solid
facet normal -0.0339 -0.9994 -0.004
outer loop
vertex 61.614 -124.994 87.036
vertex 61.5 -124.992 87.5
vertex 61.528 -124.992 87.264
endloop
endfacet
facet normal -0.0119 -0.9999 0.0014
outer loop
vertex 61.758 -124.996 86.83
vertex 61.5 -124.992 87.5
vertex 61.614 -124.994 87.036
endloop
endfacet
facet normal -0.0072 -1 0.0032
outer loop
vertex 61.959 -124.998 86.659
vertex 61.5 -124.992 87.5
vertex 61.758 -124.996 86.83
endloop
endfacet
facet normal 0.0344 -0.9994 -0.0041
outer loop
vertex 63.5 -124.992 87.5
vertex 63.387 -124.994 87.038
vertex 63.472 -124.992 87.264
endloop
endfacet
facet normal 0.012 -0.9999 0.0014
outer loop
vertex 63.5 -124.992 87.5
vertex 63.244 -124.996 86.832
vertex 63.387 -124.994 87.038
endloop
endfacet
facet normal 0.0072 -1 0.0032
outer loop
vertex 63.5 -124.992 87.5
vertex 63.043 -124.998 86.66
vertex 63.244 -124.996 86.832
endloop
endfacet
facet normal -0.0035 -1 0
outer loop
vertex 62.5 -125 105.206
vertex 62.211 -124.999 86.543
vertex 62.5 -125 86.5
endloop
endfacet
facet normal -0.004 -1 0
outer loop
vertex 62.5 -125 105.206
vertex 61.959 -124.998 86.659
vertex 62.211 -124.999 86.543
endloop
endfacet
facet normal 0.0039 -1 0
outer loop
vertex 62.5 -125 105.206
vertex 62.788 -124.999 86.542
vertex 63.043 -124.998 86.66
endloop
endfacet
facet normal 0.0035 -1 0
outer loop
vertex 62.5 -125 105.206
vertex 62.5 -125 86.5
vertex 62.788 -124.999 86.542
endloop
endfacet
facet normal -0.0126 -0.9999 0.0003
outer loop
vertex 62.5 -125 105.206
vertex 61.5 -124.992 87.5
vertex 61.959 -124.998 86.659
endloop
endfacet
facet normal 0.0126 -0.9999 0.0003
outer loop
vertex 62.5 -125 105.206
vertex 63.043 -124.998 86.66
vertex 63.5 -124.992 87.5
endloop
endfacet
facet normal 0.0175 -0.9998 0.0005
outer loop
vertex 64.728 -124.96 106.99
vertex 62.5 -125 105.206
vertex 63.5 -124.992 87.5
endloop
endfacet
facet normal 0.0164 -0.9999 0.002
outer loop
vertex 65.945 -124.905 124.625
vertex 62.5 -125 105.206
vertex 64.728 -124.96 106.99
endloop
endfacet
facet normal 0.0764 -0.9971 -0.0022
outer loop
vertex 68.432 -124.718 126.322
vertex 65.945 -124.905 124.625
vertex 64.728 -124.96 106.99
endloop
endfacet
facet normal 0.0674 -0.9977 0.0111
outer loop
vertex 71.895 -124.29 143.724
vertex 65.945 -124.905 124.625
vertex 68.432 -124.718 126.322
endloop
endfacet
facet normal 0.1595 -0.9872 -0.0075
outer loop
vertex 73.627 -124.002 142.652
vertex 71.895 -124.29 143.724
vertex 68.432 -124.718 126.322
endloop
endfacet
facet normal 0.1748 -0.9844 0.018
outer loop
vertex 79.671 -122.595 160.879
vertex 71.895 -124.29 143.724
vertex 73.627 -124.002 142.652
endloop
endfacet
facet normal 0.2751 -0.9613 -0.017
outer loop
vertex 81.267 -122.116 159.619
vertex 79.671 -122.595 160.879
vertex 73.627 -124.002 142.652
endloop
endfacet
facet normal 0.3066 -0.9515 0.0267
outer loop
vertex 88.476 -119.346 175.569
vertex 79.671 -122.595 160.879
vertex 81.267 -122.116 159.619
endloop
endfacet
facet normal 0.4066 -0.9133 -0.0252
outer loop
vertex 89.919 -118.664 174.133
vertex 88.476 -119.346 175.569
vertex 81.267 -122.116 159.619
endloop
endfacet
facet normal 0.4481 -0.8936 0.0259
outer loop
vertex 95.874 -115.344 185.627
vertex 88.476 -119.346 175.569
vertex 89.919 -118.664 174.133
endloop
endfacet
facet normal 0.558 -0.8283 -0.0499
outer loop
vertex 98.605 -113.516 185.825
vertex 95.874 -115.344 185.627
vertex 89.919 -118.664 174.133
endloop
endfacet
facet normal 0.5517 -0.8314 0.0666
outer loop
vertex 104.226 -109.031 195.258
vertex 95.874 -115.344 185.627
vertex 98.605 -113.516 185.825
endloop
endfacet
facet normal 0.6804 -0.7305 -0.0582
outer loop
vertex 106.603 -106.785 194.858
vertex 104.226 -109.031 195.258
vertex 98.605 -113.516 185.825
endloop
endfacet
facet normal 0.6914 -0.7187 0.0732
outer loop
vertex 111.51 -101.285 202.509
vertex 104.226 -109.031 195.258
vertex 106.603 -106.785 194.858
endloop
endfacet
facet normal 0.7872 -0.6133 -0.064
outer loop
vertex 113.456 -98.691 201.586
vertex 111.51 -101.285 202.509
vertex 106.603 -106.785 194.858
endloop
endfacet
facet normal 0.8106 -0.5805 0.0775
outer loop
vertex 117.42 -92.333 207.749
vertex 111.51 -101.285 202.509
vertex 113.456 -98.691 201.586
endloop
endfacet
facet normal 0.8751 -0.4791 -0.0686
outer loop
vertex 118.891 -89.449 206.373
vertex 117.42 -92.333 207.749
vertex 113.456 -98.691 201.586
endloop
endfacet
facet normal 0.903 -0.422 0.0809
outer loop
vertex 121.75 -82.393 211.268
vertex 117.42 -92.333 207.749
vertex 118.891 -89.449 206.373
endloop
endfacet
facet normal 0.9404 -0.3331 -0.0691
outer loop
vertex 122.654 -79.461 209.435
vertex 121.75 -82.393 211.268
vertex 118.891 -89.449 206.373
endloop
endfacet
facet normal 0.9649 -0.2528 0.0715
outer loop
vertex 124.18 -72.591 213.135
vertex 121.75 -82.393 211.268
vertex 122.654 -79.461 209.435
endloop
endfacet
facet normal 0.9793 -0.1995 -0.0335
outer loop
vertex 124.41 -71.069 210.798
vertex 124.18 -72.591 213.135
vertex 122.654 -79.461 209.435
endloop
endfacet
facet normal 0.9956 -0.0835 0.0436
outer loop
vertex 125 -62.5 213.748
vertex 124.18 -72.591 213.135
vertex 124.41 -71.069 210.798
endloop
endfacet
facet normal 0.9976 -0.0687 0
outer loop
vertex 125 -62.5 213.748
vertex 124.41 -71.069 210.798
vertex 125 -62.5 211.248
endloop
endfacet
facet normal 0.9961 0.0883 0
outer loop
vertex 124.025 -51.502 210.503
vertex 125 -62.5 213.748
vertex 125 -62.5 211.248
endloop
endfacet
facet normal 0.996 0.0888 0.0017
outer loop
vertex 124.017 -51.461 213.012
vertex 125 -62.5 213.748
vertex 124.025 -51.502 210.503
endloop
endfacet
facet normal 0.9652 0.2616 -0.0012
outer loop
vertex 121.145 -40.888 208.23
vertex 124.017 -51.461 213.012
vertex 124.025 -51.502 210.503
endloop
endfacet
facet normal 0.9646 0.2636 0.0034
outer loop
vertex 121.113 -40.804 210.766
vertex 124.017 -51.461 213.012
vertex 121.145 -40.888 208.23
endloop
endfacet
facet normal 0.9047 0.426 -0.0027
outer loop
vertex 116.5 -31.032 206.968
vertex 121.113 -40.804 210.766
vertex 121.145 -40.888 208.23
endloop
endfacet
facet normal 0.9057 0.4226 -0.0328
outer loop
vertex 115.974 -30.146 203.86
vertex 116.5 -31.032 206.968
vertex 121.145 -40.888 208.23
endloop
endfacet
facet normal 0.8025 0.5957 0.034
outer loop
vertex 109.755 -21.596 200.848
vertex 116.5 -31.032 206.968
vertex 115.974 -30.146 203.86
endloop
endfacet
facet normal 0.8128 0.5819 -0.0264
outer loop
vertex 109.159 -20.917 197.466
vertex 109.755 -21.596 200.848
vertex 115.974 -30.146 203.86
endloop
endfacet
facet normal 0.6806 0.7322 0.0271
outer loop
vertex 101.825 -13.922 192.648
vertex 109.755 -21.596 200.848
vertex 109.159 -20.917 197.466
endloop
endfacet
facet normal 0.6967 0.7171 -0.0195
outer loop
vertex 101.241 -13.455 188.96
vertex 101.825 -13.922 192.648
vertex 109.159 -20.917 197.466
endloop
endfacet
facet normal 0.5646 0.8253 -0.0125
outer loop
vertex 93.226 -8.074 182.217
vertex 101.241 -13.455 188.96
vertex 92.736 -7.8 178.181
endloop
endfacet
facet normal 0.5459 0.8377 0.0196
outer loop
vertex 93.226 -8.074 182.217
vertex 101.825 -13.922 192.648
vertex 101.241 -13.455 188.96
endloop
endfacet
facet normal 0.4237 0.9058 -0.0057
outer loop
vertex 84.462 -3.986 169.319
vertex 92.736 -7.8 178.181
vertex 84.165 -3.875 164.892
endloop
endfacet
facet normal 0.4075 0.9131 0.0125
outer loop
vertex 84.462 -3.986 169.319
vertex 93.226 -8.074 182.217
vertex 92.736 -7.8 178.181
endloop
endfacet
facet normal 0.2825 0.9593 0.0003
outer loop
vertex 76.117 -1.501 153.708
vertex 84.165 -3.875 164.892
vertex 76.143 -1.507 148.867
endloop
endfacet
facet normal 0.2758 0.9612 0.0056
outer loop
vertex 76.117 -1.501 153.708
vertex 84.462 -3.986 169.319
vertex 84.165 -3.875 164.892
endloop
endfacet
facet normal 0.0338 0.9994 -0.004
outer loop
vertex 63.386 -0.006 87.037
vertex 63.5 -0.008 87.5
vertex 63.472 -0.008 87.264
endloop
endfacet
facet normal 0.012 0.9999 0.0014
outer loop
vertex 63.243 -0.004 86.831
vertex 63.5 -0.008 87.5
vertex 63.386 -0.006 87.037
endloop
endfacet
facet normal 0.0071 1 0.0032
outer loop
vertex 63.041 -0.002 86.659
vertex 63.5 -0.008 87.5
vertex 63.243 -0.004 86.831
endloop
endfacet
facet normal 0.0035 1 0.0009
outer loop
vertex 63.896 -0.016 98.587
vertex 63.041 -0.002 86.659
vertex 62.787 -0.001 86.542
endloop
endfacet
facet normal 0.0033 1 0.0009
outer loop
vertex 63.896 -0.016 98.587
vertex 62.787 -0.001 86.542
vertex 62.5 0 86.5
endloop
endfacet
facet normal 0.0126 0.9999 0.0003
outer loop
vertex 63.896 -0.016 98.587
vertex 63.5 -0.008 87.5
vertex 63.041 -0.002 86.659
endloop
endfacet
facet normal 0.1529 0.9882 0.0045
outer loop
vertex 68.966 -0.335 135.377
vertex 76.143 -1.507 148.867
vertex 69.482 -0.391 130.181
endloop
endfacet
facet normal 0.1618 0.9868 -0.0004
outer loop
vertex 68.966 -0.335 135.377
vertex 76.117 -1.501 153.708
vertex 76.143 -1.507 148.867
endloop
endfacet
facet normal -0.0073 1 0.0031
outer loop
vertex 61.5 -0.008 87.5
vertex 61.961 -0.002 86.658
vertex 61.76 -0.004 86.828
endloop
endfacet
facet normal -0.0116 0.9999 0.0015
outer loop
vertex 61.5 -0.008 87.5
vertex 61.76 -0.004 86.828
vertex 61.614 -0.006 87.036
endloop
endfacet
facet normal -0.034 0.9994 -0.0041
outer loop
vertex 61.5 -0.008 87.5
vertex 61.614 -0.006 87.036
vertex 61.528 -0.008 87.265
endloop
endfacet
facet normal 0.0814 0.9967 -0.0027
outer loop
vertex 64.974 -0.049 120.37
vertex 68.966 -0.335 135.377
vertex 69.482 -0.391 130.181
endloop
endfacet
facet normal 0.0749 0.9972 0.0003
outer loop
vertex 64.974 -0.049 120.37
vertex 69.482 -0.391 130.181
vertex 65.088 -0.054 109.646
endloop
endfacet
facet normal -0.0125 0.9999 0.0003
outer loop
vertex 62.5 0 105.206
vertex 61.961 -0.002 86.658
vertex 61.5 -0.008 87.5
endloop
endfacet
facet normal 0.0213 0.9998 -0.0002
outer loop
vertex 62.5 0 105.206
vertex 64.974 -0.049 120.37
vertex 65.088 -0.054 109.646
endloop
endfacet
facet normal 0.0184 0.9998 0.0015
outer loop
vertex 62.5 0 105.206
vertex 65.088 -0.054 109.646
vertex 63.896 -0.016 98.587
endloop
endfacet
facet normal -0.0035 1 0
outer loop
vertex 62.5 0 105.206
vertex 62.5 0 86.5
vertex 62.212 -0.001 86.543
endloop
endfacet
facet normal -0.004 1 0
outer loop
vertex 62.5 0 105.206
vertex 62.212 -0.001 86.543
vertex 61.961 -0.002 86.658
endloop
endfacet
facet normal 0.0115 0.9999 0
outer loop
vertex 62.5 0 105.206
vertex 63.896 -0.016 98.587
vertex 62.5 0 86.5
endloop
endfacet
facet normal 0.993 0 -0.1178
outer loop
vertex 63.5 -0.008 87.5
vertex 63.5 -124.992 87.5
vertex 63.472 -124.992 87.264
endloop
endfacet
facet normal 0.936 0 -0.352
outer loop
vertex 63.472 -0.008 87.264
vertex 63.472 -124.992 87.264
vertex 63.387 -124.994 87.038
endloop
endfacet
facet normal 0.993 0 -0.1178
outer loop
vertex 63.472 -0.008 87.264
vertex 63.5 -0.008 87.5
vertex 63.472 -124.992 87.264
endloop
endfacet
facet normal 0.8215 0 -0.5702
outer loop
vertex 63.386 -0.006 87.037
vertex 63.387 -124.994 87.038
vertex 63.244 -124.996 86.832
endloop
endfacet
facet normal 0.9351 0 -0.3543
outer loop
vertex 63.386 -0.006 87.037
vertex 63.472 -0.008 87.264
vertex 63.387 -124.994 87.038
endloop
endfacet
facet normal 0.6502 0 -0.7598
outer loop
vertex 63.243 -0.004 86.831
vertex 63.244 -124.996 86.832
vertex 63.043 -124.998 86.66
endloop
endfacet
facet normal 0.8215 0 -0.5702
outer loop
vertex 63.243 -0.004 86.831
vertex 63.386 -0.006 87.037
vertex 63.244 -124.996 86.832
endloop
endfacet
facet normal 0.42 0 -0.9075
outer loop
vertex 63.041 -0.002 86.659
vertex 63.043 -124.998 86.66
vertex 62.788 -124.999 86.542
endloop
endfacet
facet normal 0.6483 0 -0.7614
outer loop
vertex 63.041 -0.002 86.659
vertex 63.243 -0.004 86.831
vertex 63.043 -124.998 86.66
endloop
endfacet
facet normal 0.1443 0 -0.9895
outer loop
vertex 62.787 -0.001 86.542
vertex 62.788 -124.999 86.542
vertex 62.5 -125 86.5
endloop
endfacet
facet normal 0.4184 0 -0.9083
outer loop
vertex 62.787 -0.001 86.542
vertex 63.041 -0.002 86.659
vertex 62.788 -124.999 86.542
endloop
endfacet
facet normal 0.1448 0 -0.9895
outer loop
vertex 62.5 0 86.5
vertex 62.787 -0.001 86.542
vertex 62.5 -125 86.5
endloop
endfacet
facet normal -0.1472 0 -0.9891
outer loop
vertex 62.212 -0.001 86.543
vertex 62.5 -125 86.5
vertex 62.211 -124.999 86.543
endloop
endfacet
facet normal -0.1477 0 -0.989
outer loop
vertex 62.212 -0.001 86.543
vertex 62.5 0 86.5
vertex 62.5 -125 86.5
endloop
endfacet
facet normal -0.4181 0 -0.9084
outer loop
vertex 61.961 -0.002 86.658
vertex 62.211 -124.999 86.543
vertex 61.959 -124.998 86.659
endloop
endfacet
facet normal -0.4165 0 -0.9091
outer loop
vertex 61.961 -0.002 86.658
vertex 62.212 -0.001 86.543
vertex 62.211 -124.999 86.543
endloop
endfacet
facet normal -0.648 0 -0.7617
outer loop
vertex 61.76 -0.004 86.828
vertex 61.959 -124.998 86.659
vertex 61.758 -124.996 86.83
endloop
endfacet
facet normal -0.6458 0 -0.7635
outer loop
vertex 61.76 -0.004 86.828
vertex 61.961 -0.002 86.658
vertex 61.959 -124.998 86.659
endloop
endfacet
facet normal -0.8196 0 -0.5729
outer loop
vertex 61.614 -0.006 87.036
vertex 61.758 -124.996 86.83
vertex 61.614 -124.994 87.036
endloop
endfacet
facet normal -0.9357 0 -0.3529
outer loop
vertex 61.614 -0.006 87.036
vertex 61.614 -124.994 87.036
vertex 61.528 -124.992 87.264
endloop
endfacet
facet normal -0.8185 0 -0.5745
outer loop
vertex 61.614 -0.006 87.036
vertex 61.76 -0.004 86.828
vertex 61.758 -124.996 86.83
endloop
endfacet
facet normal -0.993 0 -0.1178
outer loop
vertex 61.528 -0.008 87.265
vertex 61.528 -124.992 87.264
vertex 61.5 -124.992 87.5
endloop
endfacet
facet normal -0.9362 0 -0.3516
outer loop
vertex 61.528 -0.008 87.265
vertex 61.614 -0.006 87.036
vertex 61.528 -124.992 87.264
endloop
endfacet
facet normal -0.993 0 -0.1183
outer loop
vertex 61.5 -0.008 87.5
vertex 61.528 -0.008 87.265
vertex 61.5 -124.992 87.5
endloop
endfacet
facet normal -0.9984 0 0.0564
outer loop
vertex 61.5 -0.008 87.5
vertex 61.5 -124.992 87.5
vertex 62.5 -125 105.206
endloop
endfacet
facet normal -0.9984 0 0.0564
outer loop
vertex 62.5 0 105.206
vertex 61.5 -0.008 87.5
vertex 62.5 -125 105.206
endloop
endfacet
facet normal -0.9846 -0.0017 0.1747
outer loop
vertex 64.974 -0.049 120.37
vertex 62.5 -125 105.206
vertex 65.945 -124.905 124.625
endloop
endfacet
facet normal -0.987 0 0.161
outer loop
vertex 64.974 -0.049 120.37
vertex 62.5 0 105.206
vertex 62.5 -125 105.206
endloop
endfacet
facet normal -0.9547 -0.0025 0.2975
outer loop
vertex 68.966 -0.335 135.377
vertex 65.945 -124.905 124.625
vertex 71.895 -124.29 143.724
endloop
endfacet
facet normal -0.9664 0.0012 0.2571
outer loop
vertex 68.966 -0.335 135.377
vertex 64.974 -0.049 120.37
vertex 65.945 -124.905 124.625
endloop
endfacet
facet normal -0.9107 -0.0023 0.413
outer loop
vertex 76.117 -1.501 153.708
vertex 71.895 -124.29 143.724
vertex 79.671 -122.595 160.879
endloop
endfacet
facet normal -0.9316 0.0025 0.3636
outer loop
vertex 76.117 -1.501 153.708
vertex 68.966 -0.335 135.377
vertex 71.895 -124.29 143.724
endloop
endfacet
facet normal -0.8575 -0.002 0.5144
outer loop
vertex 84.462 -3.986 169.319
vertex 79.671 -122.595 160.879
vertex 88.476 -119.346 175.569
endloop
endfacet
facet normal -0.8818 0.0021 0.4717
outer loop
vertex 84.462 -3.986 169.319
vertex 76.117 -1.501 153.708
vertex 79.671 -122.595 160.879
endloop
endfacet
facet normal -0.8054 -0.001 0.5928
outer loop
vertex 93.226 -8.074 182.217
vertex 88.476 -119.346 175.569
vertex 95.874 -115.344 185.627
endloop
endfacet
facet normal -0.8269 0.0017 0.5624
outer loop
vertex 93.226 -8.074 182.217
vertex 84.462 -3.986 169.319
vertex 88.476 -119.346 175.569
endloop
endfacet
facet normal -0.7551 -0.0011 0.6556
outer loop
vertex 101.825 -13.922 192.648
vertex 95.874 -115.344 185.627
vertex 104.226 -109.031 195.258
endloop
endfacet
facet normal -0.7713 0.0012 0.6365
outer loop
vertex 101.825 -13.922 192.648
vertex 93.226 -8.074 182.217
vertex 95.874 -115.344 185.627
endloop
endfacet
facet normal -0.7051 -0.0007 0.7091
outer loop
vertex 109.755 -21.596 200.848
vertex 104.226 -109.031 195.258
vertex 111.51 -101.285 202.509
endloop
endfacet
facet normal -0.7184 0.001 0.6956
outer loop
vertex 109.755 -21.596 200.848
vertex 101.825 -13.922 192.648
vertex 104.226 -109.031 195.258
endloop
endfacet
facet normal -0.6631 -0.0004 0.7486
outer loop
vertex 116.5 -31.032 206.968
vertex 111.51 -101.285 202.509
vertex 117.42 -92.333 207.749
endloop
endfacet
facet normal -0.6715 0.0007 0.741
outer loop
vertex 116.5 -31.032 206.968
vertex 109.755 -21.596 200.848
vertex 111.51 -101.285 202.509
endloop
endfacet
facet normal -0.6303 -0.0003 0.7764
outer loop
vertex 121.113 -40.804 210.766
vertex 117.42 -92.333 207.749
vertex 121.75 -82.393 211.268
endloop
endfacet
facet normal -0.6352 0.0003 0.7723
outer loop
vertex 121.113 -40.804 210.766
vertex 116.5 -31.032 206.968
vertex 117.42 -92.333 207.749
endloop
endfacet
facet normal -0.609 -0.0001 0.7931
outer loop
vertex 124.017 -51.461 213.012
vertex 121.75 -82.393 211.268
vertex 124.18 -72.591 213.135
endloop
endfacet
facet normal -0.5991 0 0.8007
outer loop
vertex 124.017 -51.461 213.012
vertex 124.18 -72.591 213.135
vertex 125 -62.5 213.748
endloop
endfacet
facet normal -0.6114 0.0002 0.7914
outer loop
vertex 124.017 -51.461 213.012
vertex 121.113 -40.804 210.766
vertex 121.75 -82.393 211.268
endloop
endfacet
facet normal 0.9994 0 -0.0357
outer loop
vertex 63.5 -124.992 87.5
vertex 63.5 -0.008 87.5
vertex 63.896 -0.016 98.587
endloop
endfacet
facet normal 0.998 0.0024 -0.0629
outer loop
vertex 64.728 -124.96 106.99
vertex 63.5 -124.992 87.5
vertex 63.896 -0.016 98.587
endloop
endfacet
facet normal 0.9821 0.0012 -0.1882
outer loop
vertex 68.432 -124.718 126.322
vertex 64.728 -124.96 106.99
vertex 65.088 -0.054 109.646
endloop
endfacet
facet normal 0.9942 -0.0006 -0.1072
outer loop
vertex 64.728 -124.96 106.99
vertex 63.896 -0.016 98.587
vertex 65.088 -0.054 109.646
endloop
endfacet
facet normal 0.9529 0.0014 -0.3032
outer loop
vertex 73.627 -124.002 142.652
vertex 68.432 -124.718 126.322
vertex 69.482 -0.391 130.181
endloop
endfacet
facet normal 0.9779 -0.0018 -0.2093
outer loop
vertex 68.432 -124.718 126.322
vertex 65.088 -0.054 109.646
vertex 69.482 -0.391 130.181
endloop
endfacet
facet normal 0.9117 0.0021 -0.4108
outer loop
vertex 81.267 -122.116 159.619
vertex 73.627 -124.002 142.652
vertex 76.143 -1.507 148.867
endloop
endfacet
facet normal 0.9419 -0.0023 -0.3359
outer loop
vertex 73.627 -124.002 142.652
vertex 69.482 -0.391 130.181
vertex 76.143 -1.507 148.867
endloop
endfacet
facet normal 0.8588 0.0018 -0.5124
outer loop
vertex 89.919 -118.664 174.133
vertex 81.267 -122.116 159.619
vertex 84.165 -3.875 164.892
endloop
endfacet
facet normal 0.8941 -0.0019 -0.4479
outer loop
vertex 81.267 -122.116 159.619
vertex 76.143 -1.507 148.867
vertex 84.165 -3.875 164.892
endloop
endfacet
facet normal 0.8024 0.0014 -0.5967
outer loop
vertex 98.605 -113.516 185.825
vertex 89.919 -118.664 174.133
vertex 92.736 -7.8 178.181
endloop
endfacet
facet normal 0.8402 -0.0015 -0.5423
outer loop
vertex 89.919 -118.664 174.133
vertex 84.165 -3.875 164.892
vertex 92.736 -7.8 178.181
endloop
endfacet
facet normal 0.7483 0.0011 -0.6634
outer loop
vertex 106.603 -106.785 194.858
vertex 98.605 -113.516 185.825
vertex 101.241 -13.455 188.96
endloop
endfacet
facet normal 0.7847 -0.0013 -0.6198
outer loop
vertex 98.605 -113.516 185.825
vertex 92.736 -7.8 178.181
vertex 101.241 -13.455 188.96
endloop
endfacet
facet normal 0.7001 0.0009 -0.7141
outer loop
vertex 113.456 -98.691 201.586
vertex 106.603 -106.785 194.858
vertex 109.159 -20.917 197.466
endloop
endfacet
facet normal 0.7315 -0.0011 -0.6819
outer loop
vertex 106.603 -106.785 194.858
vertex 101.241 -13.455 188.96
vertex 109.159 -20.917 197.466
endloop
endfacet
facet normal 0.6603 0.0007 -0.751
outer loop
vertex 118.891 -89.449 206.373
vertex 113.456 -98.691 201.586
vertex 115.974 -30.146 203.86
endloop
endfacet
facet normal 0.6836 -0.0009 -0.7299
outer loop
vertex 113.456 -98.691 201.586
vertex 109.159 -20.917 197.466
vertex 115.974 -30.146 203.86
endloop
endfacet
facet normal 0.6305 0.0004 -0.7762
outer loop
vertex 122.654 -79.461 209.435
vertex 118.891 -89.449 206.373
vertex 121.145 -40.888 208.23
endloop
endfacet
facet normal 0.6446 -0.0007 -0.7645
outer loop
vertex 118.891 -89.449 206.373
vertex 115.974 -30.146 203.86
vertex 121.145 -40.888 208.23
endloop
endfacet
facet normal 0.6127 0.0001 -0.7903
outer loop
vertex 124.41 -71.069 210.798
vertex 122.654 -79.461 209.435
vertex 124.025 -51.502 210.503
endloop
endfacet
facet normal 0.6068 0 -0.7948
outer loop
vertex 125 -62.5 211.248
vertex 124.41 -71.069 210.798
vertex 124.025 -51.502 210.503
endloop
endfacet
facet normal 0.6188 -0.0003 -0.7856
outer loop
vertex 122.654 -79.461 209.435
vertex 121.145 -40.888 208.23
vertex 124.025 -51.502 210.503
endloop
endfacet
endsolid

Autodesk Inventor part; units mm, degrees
ref_plane "YZ Plane" through (0, 0, 0) normal (1, 0, 0) x (0, 1, 0)
ref_plane "XZ Plane" through (0, 0, 0) normal (0, 1, 0) x (-1, 0, 0)
ref_plane "XY Plane" through (0, 0, 0) normal (0, 0, 1) x (1, 0, 0)
sketch "Эскиз1" plane through (0, 0, 0) normal (0, 0, 1) x (1, 0, 0)
  line L0 (0, 0) -> (125, 0)
  line L1 (125, 0) -> (125, -125)
  line L2 (125, -125) -> (0, -125)
  line L3 (0, -125) -> (0, 0)
  dimension "d0" = 125
  dimension "d1" = 125
extrude "Выдавливание1" add sketch "Эскиз1" along normal blind 300
sketch "Эскиз2" plane through (125, -125, 0) normal (1, 0, 0) x (0, 0, -1)
  line L0 (0, 0) -> (-300, 0) projected
  line L1 (0, 125) -> (-300, 125) projected
  line L2 (-212.5, 0) -> (-87.5, 0)
  line L3 (-87.5, 0) -> (-87.5, 125)
  line L4 (-87.5, 125) -> (-212.5, 125)
  line L5 (-212.5, 125) -> (-212.5, 0)
  point P0 (-150, 0)
  point P1 (-150, 0)
  point P2 (-212.5, 125)
  point P3 (-87.5, 0)
  dimension "d4" = 125
  dimension "d5" = 0
extrude "Выдавливание2" add sketch "Эскиз2" along normal blind 82.5
sketch "Эскиз9" plane through (0, 0, 0) normal (0, 1, 0) x (1, 0, 0)
  line L0 (125, -212.5) -> (125, -300) projected
  line L1 (125, -279.9507) -> (0, -279.9507)
  line L2 (0, 0) -> (0, -300) projected
  line L3 (125, -87.5) -> (207.5, -87.5) projected
  line L4 (125, -87.5) -> (0, -87.5)
  circle A0 centre (218.75, -87.5) radius 156.25
  circle A1 centre (218.75, -87.5) radius 155.25
  circle A2 centre (218.75, -87.5) radius 157.25
  line L5 (125, -212.5) -> (207.5, -212.5) projected
  line L6 (125, -212.5) -> (207.5, -212.5)
  line L7 (207.5, -212.5) -> (125, -212.5)
  line L8 (125, -212.5) -> (125, -224.7107)
  line L9 (0, -279.9507) -> (125, -279.9507)
  line L10 (125, -279.9507) -> (125, -300)
  line L11 (125, -300) -> (0, -300)
  line L12 (0, -300) -> (0, -279.9507)
  circle A3 centre (62.5, -87.5) radius 1
  point P0 (63.5, -87.5)
  point P1 (61.5, -87.5)
  point P2 (125, -213.7478)
  point P3 (126.6763, -212.5)
  point P4 (63.5, -87.5)
  dimension "d19" = 93.75
  dimension "d20" = 1
  dimension "d21" = 1
extrude "Выдавливание6" cut sketch "Эскиз9" against normal blind 200 contours L0 L11 L2 L1 | A2 A3 A0 L0 | A0 A3 A1 L5 | A3 A0 L4 | L4 A0 A3 | A0 L4 A3 | A0 A3 L4 keep common part picked at (62.7561, -98.9034) picked at (121.9581, -209.089)
sketch "Эскиз11" plane through (0, 0, 300) normal (0, 0, 1) x (1, 0, 0)
  line L0 (125, 0) -> (0, 0) projected
  line L1 (0, -125) -> (0, 0) projected
  circle A0 centre (62.5, -62.5) radius 62.5
  point P0 (62.5, 0)
  point P1 (0, -62.5)
extrude "Выдавливание7" cut sketch "Эскиз11" against normal blind 300 contours A0 keep common part
sketch "Эскиз12" plane through (62.5, -62.5, 300) normal (0, 0, 1) x (1, 0, 0)
  circle A0 centre (-10.575, 6.8149) radius 127.9609
  point P0 (-62.5, 62.5)
extrude "Выдавливание8" cut sketch "Эскиз12" against normal blind 30
equation "\"Радиус_гибки\" = Толщина"
equation "\"Ширина_просечки\" = Толщина"
equation "\"Глубина_просечки\" = 0.5 * Толщина"
equation "\"Размер_просечки\" = 4 * Толщина"
equation "\"Мин_остаток\" = 2 * Толщина"
equation "\"Радиус_перехода\" = Радиус_гибки"
equation "\"Радиус_Якоби\" = Толщина"
equation "\"Размер_зазора\" = Толщина"
equation "\"Толщина\" = 2"
properties part number "труба" material "Нержавеющая сталь"
